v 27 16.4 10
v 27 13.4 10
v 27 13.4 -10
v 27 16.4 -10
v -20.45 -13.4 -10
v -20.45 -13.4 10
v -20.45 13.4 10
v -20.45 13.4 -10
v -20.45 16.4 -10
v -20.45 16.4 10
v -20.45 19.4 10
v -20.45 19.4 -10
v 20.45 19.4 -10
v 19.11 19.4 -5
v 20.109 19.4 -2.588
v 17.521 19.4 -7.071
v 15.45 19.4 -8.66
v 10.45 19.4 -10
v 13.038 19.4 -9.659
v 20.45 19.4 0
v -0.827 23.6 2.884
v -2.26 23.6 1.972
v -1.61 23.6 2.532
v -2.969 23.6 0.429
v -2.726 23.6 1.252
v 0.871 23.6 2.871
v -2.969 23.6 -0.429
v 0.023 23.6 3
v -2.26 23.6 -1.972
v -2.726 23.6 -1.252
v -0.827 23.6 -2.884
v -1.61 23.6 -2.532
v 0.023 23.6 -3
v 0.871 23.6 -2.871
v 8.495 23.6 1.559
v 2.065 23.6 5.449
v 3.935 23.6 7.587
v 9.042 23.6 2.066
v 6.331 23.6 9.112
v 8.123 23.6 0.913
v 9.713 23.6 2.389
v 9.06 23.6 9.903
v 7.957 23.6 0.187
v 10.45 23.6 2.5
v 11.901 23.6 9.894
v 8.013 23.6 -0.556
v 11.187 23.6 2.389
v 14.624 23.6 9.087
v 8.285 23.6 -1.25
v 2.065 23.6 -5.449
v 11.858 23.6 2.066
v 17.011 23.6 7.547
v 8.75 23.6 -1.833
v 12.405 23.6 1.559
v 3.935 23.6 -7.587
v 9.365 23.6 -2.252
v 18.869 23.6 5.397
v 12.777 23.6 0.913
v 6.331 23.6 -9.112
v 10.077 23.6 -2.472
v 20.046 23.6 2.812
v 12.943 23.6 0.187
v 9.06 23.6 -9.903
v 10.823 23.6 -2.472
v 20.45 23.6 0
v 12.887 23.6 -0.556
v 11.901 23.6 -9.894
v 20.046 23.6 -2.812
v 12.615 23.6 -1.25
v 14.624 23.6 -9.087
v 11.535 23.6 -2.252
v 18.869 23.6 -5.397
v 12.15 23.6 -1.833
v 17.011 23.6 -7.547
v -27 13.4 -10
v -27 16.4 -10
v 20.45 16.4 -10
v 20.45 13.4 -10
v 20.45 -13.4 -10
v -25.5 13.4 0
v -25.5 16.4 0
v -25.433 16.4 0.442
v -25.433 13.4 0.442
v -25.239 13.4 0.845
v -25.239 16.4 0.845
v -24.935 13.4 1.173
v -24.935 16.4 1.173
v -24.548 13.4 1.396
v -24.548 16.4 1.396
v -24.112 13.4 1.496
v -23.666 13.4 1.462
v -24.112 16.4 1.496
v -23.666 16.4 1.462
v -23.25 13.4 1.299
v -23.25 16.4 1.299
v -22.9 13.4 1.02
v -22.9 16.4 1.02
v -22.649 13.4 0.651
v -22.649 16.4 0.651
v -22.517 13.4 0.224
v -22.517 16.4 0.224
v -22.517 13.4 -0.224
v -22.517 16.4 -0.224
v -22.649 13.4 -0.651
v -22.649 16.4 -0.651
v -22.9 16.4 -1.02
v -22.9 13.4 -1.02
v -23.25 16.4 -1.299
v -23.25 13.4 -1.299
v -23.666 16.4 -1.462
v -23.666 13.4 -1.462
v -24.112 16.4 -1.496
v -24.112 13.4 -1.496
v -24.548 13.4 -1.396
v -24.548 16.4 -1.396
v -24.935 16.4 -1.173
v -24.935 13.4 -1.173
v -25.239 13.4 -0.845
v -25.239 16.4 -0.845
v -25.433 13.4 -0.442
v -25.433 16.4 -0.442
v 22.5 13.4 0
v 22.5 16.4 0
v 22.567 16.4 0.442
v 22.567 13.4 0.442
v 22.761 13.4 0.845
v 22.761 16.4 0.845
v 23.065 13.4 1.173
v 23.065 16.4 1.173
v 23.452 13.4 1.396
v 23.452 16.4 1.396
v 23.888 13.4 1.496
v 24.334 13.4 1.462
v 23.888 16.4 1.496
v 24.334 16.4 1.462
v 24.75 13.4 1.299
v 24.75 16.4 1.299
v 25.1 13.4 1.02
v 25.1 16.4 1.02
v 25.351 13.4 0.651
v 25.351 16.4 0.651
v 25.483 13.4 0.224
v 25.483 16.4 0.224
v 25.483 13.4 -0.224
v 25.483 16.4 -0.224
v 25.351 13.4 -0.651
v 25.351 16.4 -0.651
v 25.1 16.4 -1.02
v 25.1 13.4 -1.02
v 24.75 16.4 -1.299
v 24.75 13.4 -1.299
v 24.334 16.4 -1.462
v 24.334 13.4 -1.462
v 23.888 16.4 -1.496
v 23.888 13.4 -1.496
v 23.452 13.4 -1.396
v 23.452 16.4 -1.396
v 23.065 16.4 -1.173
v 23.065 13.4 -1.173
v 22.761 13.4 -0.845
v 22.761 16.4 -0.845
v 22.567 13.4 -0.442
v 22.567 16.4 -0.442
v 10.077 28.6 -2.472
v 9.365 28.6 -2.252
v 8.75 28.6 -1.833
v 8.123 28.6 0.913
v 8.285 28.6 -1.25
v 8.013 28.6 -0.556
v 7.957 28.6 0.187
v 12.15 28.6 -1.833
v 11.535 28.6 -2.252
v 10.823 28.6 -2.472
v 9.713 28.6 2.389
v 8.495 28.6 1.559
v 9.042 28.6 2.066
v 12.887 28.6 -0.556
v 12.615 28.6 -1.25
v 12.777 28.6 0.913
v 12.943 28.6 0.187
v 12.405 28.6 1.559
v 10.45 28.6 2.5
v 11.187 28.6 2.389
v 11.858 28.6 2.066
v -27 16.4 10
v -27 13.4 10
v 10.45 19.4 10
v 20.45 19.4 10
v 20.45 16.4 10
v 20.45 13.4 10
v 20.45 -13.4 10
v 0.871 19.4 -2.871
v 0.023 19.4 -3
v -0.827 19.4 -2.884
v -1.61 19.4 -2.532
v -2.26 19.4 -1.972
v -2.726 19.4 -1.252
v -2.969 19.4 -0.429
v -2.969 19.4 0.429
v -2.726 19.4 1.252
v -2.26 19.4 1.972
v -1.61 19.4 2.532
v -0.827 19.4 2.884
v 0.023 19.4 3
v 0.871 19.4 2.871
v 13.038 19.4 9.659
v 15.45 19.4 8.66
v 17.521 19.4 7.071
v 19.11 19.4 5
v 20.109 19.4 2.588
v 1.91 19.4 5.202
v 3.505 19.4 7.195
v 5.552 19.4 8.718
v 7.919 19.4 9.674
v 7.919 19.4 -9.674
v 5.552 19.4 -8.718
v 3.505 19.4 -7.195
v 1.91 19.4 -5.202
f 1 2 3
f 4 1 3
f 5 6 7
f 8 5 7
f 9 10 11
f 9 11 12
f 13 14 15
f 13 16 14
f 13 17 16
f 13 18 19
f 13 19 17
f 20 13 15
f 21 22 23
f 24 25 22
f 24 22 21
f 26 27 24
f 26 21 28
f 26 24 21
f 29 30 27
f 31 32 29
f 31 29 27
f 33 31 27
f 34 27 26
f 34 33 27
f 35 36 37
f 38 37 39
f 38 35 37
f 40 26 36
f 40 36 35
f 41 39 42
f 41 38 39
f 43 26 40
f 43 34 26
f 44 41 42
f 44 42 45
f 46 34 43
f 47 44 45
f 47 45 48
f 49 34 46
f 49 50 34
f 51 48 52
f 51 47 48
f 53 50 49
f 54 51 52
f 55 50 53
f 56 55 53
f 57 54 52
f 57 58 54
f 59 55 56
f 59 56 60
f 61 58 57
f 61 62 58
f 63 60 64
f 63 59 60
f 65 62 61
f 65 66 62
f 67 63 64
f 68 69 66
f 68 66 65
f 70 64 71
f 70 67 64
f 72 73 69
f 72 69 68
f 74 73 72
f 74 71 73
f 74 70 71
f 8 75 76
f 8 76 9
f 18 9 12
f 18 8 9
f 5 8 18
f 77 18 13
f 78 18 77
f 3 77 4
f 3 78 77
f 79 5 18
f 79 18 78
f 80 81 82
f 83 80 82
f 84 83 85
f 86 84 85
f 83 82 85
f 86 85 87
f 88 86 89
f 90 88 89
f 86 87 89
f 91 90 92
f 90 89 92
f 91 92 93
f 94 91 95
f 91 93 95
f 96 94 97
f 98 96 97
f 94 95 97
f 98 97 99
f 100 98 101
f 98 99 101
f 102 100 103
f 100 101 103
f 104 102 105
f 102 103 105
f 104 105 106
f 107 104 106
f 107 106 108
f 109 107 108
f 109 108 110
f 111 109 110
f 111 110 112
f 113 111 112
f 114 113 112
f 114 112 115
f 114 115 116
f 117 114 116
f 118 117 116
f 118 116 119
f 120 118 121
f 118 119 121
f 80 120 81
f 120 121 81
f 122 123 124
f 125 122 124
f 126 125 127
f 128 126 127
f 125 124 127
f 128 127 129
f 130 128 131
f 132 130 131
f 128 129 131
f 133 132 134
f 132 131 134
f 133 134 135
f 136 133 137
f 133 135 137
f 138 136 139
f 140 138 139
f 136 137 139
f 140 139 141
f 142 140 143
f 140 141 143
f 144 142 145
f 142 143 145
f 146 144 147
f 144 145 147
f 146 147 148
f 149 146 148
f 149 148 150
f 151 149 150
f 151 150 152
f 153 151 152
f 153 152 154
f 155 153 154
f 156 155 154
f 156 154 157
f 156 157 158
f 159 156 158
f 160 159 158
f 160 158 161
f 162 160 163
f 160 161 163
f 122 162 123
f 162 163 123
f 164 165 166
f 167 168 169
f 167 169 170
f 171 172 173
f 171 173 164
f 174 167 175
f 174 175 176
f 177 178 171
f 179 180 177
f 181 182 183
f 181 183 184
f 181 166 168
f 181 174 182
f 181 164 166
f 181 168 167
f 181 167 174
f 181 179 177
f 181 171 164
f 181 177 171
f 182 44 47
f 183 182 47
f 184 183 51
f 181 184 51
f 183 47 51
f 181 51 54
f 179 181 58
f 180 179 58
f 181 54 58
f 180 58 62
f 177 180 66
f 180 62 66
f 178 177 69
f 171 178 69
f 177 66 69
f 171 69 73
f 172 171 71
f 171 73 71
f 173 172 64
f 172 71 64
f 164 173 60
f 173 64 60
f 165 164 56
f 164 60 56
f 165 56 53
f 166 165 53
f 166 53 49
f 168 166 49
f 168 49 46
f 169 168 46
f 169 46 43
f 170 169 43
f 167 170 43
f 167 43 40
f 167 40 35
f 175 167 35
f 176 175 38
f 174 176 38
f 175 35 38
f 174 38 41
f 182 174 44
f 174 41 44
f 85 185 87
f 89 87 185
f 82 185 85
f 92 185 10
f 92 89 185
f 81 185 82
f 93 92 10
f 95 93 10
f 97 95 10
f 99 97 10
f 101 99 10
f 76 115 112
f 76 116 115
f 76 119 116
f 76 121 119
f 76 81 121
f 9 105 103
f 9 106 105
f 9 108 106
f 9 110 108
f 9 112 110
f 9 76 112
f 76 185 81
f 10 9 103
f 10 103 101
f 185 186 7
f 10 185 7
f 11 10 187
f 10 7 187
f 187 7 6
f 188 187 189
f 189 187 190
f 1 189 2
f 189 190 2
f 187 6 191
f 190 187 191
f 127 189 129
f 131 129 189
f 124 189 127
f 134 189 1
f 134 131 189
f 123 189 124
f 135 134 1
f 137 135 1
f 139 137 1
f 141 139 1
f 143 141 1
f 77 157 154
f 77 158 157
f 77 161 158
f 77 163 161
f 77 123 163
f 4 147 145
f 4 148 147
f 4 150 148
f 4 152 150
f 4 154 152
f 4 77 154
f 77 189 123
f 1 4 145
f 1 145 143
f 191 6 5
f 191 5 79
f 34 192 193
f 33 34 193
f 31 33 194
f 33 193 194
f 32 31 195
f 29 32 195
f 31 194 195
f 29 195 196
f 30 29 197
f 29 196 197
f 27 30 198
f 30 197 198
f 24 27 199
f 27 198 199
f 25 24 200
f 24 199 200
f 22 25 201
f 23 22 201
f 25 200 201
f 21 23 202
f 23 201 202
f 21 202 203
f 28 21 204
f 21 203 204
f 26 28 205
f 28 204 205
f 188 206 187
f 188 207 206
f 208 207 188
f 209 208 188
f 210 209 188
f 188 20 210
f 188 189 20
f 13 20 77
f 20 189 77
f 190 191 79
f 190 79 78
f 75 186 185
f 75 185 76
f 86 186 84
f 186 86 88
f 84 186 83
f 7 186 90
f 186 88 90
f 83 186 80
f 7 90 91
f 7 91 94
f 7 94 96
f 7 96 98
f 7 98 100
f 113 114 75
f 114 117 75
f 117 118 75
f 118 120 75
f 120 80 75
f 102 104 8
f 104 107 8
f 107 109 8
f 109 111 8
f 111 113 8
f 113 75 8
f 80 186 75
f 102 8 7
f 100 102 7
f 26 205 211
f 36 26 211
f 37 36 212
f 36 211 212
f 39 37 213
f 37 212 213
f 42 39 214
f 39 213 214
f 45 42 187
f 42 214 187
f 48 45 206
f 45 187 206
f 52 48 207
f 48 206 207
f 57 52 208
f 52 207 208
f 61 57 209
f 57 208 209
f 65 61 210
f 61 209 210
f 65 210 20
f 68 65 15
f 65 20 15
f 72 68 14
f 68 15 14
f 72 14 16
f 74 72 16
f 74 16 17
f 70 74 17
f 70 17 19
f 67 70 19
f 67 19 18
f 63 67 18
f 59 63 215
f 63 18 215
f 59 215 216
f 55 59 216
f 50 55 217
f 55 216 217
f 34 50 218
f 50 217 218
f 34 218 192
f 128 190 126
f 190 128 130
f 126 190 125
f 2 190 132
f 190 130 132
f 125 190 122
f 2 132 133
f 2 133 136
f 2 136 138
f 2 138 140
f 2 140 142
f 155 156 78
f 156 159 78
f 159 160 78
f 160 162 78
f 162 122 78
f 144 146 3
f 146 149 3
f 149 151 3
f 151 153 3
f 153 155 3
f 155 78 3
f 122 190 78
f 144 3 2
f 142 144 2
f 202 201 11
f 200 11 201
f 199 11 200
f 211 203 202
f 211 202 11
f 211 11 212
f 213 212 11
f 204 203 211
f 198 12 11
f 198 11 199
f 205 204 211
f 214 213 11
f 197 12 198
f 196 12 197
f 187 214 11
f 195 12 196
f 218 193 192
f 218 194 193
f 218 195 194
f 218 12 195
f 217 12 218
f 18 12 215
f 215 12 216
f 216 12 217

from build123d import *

# Parameters (mm, degrees)
SKETCH1_W           = 40.9
SKETCH1_H           = 26.8
BOSS_EXTRUDE1_DEPTH = 10
SKETCH2_W           = 54
SKETCH2_H           = 20
BOSS_EXTRUDE2_DEPTH = 3
SKETCH3_R           = 1.5
CUT_EXTRUDE1_DEPTH  = 3
SKETCH4_W           = 40.9
SKETCH4_H           = 20
BOSS_EXTRUDE3_DEPTH = 3
BOSS_EXTRUDE4_DEPTH = 4.2
SKETCH6_R           = 2.5
BOSS_EXTRUDE5_DEPTH = 5


with BuildPart() as part:
    # Sketch1 → Boss-Extrude1 (new, symmetric)
    with BuildSketch(Plane.XY):
        Rectangle(SKETCH1_W, SKETCH1_H)
    extrude(amount=BOSS_EXTRUDE1_DEPTH, both=True)

    # Sketch2 → Boss-Extrude2 (add)
    with BuildSketch(Plane(origin=(0, 13.4, 0), x_dir=(1, 0, 0), z_dir=(0, 1, 0))):
        Rectangle(SKETCH2_W, SKETCH2_H)
    extrude(amount=BOSS_EXTRUDE2_DEPTH)

    # Sketch3 → Cut-Extrude1 (cut)
    with BuildSketch(Plane(origin=(0, 16.4, 0), x_dir=(1, 0, 0), z_dir=(0, 1, 0))):
        with Locations(Location((-24, 0, 0), (0, 0, 180))):
            Circle(SKETCH3_R)
        with Locations(Location((24, 0, 0), (0, 0, 180))):
            Circle(SKETCH3_R)
    extrude(amount=-CUT_EXTRUDE1_DEPTH, mode=Mode.SUBTRACT)

    # Sketch4 → Boss-Extrude3 (add)
    with BuildSketch(Plane(origin=(0, 16.4, 0), x_dir=(1, 0, 0), z_dir=(0, 1, 0))):
        Rectangle(SKETCH4_W, SKETCH4_H)
    extrude(amount=BOSS_EXTRUDE3_DEPTH)

    # Sketch5 → Boss-Extrude4 (add)
    with BuildSketch(Plane(origin=(0, 19.4, 0), x_dir=(1, 0, 0), z_dir=(0, 1, 0))):
        with BuildLine():
            ThreePointArc((0.870933014, -2.870797047), (20.45, 0), (0.870933014, 2.870797047))
            ThreePointArc((0.870933014, 2.870797047), (-3, 0), (0.870933014, -2.870797047))
        make_face()
    extrude(amount=BOSS_EXTRUDE4_DEPTH)

    # Sketch6 → Boss-Extrude5 (add)
    with BuildSketch(Plane(origin=(0, 23.6, 0), x_dir=(1, 0, 0), z_dir=(0, 1, 0))):
        with Locations(Location((10.45, 0, 0), (0, 0, 270))):
            Circle(SKETCH6_R)
    extrude(amount=BOSS_EXTRUDE5_DEPTH)


solid = part.part
